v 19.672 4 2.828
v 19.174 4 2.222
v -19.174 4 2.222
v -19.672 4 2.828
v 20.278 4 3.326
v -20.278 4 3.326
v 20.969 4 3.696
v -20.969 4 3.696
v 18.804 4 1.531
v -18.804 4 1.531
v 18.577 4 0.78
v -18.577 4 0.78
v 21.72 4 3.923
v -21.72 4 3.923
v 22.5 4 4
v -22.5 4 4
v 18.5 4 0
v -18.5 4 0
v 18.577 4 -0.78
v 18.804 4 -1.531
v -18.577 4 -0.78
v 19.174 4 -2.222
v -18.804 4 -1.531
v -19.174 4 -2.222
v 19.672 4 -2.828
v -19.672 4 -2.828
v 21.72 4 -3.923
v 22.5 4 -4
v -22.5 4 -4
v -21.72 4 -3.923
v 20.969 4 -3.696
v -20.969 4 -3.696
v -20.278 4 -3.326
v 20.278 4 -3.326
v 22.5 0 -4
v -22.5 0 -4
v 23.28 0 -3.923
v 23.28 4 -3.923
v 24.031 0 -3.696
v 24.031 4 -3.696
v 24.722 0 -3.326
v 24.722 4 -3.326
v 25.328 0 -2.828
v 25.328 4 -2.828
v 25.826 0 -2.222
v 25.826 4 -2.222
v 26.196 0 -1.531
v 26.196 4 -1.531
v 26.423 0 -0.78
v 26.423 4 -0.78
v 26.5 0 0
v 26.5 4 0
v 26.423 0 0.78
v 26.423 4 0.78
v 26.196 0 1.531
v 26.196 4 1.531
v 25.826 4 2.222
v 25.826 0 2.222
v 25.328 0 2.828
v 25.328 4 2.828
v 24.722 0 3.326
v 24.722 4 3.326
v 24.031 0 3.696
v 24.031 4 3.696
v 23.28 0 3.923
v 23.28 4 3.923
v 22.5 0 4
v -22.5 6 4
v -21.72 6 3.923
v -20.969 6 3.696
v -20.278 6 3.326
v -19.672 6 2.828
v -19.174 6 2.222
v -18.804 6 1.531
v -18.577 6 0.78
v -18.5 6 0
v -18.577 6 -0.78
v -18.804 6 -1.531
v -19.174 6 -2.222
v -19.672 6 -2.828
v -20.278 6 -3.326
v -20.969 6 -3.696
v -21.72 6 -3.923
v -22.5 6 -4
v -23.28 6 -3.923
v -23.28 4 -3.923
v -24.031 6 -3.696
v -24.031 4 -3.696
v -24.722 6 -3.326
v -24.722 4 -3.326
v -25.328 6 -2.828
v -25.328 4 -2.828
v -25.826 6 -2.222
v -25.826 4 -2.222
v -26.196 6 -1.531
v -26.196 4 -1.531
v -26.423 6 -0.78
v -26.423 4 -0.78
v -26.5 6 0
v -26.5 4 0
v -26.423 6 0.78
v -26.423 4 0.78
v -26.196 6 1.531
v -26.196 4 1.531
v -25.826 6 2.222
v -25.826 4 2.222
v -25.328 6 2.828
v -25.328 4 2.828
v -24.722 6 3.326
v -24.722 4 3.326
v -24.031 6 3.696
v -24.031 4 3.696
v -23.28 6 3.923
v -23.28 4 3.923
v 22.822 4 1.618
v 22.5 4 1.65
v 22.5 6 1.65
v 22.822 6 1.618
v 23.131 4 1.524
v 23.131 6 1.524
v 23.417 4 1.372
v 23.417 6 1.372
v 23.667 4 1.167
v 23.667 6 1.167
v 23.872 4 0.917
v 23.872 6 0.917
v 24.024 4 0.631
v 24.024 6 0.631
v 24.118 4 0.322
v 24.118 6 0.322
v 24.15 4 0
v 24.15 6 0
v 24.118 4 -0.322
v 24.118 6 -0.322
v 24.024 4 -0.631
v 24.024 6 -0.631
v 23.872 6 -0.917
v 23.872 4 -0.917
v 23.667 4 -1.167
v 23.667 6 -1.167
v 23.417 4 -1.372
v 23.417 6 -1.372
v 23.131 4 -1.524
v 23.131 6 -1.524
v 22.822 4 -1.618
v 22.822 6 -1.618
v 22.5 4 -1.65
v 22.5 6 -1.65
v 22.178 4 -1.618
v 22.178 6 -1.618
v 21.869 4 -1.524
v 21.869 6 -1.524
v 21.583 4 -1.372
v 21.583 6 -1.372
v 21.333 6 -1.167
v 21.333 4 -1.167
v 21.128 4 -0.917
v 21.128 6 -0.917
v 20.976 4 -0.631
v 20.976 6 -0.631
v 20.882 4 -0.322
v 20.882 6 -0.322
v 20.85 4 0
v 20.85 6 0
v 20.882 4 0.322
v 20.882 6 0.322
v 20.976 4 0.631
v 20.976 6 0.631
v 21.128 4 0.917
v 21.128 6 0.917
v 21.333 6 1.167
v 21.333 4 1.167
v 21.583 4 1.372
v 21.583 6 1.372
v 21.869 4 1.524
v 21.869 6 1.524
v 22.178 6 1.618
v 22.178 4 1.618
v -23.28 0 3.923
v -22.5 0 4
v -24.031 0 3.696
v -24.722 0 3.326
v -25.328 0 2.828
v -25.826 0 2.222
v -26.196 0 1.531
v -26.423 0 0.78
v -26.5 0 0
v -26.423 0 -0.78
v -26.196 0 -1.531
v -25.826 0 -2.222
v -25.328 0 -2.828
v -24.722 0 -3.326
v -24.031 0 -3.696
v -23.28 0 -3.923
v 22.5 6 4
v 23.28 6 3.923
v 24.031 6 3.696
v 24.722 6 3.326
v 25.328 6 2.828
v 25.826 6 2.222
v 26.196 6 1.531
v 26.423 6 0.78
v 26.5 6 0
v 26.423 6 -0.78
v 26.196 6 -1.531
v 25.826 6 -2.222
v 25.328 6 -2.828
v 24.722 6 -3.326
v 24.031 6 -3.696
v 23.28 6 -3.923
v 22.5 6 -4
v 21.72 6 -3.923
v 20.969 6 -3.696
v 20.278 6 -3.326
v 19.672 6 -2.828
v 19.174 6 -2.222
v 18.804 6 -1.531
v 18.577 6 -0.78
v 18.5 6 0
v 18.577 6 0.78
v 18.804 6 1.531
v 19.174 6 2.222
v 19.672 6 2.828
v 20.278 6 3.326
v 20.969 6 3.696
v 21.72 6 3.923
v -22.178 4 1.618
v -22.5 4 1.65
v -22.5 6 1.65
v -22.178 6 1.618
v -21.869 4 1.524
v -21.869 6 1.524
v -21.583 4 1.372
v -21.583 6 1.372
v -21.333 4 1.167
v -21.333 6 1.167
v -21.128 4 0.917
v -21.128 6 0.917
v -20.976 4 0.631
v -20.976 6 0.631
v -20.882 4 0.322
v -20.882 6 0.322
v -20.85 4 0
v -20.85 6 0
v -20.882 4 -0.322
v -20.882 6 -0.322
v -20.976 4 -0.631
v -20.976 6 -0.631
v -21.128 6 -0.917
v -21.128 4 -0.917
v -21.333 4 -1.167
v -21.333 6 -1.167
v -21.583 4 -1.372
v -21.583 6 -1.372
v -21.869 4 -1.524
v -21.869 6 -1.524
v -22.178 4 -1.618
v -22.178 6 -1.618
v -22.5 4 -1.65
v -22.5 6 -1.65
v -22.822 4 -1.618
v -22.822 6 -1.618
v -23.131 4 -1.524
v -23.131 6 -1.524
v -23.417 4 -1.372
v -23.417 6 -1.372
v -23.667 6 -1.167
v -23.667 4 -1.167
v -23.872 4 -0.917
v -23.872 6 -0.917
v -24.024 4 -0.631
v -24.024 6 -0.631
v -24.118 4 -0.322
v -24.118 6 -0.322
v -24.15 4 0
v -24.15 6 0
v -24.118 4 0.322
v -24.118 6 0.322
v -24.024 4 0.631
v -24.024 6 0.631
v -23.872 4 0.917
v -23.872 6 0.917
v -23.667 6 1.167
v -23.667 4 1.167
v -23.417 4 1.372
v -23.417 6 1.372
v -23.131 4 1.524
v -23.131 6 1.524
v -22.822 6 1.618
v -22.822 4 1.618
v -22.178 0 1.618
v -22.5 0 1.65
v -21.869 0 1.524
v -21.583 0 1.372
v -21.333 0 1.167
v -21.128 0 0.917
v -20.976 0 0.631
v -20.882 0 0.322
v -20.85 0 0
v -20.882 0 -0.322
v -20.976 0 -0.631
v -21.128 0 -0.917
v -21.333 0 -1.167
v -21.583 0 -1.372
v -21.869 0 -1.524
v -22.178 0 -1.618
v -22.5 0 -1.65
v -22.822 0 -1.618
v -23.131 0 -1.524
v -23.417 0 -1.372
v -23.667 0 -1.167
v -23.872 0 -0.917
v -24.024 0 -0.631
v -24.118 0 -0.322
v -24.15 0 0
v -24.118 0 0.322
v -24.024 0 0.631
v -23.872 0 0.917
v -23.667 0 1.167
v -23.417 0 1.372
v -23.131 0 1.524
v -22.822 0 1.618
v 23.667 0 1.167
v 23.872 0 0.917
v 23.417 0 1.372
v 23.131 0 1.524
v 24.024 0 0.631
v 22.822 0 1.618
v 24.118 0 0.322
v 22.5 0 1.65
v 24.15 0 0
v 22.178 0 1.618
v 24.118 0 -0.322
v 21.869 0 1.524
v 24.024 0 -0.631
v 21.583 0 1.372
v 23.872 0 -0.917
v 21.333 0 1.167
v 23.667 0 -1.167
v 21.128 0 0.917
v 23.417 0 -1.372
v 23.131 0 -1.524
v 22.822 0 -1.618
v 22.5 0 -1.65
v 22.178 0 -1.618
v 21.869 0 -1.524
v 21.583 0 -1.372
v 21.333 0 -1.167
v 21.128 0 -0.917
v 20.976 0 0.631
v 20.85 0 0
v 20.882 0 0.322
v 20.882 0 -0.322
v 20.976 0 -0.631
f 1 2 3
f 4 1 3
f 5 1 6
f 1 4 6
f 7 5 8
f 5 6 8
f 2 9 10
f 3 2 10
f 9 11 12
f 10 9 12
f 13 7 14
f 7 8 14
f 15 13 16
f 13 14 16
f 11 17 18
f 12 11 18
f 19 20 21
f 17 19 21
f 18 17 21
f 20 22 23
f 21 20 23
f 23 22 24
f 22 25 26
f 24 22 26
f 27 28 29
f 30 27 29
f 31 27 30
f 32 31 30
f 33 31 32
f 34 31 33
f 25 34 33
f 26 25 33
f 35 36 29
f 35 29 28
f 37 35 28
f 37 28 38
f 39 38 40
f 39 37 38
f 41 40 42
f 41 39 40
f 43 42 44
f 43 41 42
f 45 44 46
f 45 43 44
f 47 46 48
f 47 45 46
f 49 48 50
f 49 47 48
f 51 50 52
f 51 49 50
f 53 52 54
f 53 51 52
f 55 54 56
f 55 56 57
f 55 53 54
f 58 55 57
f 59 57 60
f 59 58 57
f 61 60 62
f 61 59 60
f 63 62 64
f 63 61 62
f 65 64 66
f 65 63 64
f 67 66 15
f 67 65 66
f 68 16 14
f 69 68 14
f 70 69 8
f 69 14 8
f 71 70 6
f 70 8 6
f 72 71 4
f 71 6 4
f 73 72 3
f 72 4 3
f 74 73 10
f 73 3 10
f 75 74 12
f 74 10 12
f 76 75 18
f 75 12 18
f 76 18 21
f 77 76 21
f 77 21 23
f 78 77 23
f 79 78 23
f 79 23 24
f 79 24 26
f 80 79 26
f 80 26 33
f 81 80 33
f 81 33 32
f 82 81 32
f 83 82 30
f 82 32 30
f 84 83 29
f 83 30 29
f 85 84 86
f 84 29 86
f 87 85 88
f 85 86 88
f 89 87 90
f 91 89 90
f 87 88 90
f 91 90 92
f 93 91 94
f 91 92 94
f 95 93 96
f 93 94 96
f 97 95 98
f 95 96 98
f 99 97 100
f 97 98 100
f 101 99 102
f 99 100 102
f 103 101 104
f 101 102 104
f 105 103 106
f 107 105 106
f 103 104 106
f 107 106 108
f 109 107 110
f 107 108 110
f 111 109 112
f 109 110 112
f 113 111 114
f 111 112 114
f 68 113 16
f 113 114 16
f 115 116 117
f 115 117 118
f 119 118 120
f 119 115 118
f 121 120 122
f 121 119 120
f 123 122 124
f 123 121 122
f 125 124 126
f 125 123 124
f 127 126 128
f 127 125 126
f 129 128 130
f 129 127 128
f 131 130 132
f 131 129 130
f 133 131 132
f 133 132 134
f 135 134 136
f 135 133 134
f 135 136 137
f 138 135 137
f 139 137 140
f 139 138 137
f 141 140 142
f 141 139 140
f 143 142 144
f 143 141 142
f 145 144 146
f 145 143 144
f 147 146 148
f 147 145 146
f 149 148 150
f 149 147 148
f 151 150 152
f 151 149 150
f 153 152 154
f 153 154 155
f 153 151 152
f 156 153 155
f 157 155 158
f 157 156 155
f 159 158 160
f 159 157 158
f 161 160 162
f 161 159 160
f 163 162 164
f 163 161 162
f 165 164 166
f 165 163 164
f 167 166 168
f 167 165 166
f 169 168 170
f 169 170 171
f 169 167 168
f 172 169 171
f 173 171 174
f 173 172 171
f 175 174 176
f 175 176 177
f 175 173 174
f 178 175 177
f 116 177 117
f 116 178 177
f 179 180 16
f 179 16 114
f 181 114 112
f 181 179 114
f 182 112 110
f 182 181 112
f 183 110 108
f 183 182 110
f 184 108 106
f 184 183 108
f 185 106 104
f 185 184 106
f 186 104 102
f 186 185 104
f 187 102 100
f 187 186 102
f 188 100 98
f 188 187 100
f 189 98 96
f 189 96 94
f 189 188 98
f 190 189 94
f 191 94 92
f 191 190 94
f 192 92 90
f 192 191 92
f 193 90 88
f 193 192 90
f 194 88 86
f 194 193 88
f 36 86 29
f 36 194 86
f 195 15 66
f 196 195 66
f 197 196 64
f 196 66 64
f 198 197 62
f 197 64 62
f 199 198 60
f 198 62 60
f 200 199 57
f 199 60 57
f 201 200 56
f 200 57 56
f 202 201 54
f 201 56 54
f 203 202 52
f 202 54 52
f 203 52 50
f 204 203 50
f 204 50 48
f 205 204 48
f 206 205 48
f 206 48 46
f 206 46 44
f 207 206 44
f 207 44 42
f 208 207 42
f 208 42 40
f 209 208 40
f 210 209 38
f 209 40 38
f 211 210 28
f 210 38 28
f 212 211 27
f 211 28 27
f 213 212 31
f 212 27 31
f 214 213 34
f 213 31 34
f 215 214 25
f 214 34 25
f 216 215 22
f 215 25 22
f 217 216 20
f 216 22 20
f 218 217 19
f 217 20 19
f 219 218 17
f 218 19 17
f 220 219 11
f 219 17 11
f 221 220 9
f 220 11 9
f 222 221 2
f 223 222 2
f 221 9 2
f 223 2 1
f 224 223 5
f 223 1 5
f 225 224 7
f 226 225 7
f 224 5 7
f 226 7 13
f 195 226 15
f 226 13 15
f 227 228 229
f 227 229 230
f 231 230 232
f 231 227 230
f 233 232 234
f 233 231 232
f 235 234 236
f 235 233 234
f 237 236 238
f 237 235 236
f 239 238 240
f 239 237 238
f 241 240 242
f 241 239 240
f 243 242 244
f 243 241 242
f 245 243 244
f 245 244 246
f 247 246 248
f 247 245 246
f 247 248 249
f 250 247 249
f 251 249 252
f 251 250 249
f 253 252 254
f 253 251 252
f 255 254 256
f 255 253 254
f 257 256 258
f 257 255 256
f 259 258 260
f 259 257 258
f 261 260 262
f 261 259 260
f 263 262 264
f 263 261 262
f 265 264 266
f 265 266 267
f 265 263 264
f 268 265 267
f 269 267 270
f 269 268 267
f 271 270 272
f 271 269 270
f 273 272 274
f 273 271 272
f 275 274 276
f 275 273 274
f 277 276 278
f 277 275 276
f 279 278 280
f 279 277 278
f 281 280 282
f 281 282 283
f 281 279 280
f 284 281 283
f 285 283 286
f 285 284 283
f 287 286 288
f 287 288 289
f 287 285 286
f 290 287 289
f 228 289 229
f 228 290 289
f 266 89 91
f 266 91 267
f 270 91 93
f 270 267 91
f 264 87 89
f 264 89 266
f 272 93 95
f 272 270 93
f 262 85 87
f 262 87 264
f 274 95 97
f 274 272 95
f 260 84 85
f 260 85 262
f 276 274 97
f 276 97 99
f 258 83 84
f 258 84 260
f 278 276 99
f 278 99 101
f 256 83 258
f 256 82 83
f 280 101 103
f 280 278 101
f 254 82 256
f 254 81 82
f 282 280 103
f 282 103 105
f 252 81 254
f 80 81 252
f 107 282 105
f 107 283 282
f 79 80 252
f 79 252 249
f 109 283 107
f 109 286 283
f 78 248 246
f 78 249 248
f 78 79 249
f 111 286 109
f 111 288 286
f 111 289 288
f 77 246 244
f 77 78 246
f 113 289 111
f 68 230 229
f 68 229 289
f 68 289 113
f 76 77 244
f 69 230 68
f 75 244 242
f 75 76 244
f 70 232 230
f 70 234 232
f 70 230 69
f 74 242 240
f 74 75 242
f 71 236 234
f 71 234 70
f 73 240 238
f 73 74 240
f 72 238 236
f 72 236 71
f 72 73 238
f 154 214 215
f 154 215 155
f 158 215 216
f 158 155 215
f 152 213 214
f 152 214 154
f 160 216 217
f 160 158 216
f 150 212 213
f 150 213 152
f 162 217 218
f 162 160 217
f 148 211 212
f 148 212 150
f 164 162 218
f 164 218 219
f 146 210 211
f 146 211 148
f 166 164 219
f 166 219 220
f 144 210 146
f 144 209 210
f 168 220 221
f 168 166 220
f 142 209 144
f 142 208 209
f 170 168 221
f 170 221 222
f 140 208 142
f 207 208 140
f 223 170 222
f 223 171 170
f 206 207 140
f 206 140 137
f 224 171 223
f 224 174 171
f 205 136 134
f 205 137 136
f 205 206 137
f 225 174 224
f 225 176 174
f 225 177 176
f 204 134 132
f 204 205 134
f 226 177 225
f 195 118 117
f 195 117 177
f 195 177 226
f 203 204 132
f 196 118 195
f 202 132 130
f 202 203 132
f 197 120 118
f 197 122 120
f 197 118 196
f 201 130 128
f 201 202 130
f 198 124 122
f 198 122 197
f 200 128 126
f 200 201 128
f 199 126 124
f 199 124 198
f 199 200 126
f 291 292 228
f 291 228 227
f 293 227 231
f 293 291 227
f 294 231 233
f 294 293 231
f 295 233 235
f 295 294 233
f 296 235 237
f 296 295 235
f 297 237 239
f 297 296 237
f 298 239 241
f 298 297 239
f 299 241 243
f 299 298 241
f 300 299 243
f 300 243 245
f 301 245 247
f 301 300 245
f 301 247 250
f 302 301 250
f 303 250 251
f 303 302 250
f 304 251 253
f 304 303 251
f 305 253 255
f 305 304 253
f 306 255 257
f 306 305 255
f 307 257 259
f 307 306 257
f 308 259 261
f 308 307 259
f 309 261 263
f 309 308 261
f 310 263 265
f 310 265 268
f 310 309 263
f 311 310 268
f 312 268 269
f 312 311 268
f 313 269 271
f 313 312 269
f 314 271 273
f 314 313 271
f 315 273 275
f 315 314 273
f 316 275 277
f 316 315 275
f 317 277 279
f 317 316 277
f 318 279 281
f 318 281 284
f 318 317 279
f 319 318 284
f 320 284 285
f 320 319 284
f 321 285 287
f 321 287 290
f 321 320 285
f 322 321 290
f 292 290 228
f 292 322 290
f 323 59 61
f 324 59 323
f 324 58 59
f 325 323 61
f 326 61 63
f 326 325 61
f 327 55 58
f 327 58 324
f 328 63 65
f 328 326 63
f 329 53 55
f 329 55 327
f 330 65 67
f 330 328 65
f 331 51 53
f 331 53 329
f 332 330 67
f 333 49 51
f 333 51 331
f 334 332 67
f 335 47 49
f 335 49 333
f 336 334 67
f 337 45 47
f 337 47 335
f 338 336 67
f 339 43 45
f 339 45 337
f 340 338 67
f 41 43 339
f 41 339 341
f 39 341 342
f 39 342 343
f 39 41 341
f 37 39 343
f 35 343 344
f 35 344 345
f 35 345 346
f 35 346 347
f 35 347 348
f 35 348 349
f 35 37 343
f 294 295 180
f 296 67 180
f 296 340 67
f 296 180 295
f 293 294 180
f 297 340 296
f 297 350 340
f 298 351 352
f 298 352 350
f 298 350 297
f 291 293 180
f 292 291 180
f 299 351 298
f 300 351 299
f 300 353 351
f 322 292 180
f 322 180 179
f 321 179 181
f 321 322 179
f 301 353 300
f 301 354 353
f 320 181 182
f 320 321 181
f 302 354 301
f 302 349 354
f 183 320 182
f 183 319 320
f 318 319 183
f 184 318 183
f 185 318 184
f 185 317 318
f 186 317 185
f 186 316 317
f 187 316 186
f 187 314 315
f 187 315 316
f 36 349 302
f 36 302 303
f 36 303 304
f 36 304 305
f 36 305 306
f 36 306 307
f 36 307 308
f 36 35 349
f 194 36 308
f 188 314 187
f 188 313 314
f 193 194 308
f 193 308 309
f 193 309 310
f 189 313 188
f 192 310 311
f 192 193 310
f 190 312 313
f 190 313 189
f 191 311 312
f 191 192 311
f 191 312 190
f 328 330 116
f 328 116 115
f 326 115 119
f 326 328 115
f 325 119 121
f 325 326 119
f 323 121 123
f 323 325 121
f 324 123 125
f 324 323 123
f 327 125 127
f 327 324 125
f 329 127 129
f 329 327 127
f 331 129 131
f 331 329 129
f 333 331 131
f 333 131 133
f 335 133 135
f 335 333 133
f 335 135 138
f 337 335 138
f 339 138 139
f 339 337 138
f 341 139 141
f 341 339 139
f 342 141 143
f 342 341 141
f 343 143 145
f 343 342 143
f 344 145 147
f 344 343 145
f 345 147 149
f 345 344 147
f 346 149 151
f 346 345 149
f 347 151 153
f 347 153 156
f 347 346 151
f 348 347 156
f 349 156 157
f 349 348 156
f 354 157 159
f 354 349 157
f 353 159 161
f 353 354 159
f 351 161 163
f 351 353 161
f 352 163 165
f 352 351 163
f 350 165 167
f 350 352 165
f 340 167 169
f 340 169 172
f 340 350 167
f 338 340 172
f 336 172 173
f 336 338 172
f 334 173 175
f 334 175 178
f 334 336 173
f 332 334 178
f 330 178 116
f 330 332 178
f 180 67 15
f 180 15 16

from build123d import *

# Parameters (mm, degrees)
SKETCH1_R           = 1.65
BOSS_EXTRUDE1_DEPTH = 4
SKETCH2_R           = 4
SKETCH2_R_2         = 1.65
BOSS_EXTRUDE2_DEPTH = 2


with BuildPart() as part:
    # Sketch1 → Boss-Extrude1 (new body)
    with BuildSketch(Plane(origin=(0, 0, 0), x_dir=(1, 0, 0), z_dir=(0, 1, 0))):
        with BuildLine():
            Line((-22.5, 4), (22.5, 4))
            ThreePointArc((22.5, 4), (26.5, 0), (22.5, -4))
            Line((22.5, -4), (-22.5, -4))
            ThreePointArc((-22.5, -4), (-26.5, 0), (-22.5, 4))
        make_face()
        with Locations((-22.5, 0)):
            Circle(SKETCH1_R, mode=Mode.SUBTRACT)
        with Locations((22.5, 0)):
            Circle(SKETCH1_R, mode=Mode.SUBTRACT)
    extrude(amount=BOSS_EXTRUDE1_DEPTH)

    # Sketch2 → Boss-Extrude2 (add)
    # profile 1 of 2: a face of its own
    with BuildSketch(Plane(origin=(0, 4, 0), x_dir=(1, 0, 0), z_dir=(0, 1, 0))):
        with Locations((-22.5, 0)):
            Circle(SKETCH2_R)
        with Locations((-22.5, 0)):
            Circle(SKETCH2_R_2, mode=Mode.SUBTRACT)
    # profile 2 of 2: a face of its own
    with BuildSketch(Plane(origin=(0, 4, 0), x_dir=(1, 0, 0), z_dir=(0, 1, 0))):
        with Locations((22.5, 0)):
            Circle(SKETCH2_R)
        with Locations((22.5, 0)):
            Circle(SKETCH2_R_2, mode=Mode.SUBTRACT)
    extrude(amount=BOSS_EXTRUDE2_DEPTH)


solid = part.part
